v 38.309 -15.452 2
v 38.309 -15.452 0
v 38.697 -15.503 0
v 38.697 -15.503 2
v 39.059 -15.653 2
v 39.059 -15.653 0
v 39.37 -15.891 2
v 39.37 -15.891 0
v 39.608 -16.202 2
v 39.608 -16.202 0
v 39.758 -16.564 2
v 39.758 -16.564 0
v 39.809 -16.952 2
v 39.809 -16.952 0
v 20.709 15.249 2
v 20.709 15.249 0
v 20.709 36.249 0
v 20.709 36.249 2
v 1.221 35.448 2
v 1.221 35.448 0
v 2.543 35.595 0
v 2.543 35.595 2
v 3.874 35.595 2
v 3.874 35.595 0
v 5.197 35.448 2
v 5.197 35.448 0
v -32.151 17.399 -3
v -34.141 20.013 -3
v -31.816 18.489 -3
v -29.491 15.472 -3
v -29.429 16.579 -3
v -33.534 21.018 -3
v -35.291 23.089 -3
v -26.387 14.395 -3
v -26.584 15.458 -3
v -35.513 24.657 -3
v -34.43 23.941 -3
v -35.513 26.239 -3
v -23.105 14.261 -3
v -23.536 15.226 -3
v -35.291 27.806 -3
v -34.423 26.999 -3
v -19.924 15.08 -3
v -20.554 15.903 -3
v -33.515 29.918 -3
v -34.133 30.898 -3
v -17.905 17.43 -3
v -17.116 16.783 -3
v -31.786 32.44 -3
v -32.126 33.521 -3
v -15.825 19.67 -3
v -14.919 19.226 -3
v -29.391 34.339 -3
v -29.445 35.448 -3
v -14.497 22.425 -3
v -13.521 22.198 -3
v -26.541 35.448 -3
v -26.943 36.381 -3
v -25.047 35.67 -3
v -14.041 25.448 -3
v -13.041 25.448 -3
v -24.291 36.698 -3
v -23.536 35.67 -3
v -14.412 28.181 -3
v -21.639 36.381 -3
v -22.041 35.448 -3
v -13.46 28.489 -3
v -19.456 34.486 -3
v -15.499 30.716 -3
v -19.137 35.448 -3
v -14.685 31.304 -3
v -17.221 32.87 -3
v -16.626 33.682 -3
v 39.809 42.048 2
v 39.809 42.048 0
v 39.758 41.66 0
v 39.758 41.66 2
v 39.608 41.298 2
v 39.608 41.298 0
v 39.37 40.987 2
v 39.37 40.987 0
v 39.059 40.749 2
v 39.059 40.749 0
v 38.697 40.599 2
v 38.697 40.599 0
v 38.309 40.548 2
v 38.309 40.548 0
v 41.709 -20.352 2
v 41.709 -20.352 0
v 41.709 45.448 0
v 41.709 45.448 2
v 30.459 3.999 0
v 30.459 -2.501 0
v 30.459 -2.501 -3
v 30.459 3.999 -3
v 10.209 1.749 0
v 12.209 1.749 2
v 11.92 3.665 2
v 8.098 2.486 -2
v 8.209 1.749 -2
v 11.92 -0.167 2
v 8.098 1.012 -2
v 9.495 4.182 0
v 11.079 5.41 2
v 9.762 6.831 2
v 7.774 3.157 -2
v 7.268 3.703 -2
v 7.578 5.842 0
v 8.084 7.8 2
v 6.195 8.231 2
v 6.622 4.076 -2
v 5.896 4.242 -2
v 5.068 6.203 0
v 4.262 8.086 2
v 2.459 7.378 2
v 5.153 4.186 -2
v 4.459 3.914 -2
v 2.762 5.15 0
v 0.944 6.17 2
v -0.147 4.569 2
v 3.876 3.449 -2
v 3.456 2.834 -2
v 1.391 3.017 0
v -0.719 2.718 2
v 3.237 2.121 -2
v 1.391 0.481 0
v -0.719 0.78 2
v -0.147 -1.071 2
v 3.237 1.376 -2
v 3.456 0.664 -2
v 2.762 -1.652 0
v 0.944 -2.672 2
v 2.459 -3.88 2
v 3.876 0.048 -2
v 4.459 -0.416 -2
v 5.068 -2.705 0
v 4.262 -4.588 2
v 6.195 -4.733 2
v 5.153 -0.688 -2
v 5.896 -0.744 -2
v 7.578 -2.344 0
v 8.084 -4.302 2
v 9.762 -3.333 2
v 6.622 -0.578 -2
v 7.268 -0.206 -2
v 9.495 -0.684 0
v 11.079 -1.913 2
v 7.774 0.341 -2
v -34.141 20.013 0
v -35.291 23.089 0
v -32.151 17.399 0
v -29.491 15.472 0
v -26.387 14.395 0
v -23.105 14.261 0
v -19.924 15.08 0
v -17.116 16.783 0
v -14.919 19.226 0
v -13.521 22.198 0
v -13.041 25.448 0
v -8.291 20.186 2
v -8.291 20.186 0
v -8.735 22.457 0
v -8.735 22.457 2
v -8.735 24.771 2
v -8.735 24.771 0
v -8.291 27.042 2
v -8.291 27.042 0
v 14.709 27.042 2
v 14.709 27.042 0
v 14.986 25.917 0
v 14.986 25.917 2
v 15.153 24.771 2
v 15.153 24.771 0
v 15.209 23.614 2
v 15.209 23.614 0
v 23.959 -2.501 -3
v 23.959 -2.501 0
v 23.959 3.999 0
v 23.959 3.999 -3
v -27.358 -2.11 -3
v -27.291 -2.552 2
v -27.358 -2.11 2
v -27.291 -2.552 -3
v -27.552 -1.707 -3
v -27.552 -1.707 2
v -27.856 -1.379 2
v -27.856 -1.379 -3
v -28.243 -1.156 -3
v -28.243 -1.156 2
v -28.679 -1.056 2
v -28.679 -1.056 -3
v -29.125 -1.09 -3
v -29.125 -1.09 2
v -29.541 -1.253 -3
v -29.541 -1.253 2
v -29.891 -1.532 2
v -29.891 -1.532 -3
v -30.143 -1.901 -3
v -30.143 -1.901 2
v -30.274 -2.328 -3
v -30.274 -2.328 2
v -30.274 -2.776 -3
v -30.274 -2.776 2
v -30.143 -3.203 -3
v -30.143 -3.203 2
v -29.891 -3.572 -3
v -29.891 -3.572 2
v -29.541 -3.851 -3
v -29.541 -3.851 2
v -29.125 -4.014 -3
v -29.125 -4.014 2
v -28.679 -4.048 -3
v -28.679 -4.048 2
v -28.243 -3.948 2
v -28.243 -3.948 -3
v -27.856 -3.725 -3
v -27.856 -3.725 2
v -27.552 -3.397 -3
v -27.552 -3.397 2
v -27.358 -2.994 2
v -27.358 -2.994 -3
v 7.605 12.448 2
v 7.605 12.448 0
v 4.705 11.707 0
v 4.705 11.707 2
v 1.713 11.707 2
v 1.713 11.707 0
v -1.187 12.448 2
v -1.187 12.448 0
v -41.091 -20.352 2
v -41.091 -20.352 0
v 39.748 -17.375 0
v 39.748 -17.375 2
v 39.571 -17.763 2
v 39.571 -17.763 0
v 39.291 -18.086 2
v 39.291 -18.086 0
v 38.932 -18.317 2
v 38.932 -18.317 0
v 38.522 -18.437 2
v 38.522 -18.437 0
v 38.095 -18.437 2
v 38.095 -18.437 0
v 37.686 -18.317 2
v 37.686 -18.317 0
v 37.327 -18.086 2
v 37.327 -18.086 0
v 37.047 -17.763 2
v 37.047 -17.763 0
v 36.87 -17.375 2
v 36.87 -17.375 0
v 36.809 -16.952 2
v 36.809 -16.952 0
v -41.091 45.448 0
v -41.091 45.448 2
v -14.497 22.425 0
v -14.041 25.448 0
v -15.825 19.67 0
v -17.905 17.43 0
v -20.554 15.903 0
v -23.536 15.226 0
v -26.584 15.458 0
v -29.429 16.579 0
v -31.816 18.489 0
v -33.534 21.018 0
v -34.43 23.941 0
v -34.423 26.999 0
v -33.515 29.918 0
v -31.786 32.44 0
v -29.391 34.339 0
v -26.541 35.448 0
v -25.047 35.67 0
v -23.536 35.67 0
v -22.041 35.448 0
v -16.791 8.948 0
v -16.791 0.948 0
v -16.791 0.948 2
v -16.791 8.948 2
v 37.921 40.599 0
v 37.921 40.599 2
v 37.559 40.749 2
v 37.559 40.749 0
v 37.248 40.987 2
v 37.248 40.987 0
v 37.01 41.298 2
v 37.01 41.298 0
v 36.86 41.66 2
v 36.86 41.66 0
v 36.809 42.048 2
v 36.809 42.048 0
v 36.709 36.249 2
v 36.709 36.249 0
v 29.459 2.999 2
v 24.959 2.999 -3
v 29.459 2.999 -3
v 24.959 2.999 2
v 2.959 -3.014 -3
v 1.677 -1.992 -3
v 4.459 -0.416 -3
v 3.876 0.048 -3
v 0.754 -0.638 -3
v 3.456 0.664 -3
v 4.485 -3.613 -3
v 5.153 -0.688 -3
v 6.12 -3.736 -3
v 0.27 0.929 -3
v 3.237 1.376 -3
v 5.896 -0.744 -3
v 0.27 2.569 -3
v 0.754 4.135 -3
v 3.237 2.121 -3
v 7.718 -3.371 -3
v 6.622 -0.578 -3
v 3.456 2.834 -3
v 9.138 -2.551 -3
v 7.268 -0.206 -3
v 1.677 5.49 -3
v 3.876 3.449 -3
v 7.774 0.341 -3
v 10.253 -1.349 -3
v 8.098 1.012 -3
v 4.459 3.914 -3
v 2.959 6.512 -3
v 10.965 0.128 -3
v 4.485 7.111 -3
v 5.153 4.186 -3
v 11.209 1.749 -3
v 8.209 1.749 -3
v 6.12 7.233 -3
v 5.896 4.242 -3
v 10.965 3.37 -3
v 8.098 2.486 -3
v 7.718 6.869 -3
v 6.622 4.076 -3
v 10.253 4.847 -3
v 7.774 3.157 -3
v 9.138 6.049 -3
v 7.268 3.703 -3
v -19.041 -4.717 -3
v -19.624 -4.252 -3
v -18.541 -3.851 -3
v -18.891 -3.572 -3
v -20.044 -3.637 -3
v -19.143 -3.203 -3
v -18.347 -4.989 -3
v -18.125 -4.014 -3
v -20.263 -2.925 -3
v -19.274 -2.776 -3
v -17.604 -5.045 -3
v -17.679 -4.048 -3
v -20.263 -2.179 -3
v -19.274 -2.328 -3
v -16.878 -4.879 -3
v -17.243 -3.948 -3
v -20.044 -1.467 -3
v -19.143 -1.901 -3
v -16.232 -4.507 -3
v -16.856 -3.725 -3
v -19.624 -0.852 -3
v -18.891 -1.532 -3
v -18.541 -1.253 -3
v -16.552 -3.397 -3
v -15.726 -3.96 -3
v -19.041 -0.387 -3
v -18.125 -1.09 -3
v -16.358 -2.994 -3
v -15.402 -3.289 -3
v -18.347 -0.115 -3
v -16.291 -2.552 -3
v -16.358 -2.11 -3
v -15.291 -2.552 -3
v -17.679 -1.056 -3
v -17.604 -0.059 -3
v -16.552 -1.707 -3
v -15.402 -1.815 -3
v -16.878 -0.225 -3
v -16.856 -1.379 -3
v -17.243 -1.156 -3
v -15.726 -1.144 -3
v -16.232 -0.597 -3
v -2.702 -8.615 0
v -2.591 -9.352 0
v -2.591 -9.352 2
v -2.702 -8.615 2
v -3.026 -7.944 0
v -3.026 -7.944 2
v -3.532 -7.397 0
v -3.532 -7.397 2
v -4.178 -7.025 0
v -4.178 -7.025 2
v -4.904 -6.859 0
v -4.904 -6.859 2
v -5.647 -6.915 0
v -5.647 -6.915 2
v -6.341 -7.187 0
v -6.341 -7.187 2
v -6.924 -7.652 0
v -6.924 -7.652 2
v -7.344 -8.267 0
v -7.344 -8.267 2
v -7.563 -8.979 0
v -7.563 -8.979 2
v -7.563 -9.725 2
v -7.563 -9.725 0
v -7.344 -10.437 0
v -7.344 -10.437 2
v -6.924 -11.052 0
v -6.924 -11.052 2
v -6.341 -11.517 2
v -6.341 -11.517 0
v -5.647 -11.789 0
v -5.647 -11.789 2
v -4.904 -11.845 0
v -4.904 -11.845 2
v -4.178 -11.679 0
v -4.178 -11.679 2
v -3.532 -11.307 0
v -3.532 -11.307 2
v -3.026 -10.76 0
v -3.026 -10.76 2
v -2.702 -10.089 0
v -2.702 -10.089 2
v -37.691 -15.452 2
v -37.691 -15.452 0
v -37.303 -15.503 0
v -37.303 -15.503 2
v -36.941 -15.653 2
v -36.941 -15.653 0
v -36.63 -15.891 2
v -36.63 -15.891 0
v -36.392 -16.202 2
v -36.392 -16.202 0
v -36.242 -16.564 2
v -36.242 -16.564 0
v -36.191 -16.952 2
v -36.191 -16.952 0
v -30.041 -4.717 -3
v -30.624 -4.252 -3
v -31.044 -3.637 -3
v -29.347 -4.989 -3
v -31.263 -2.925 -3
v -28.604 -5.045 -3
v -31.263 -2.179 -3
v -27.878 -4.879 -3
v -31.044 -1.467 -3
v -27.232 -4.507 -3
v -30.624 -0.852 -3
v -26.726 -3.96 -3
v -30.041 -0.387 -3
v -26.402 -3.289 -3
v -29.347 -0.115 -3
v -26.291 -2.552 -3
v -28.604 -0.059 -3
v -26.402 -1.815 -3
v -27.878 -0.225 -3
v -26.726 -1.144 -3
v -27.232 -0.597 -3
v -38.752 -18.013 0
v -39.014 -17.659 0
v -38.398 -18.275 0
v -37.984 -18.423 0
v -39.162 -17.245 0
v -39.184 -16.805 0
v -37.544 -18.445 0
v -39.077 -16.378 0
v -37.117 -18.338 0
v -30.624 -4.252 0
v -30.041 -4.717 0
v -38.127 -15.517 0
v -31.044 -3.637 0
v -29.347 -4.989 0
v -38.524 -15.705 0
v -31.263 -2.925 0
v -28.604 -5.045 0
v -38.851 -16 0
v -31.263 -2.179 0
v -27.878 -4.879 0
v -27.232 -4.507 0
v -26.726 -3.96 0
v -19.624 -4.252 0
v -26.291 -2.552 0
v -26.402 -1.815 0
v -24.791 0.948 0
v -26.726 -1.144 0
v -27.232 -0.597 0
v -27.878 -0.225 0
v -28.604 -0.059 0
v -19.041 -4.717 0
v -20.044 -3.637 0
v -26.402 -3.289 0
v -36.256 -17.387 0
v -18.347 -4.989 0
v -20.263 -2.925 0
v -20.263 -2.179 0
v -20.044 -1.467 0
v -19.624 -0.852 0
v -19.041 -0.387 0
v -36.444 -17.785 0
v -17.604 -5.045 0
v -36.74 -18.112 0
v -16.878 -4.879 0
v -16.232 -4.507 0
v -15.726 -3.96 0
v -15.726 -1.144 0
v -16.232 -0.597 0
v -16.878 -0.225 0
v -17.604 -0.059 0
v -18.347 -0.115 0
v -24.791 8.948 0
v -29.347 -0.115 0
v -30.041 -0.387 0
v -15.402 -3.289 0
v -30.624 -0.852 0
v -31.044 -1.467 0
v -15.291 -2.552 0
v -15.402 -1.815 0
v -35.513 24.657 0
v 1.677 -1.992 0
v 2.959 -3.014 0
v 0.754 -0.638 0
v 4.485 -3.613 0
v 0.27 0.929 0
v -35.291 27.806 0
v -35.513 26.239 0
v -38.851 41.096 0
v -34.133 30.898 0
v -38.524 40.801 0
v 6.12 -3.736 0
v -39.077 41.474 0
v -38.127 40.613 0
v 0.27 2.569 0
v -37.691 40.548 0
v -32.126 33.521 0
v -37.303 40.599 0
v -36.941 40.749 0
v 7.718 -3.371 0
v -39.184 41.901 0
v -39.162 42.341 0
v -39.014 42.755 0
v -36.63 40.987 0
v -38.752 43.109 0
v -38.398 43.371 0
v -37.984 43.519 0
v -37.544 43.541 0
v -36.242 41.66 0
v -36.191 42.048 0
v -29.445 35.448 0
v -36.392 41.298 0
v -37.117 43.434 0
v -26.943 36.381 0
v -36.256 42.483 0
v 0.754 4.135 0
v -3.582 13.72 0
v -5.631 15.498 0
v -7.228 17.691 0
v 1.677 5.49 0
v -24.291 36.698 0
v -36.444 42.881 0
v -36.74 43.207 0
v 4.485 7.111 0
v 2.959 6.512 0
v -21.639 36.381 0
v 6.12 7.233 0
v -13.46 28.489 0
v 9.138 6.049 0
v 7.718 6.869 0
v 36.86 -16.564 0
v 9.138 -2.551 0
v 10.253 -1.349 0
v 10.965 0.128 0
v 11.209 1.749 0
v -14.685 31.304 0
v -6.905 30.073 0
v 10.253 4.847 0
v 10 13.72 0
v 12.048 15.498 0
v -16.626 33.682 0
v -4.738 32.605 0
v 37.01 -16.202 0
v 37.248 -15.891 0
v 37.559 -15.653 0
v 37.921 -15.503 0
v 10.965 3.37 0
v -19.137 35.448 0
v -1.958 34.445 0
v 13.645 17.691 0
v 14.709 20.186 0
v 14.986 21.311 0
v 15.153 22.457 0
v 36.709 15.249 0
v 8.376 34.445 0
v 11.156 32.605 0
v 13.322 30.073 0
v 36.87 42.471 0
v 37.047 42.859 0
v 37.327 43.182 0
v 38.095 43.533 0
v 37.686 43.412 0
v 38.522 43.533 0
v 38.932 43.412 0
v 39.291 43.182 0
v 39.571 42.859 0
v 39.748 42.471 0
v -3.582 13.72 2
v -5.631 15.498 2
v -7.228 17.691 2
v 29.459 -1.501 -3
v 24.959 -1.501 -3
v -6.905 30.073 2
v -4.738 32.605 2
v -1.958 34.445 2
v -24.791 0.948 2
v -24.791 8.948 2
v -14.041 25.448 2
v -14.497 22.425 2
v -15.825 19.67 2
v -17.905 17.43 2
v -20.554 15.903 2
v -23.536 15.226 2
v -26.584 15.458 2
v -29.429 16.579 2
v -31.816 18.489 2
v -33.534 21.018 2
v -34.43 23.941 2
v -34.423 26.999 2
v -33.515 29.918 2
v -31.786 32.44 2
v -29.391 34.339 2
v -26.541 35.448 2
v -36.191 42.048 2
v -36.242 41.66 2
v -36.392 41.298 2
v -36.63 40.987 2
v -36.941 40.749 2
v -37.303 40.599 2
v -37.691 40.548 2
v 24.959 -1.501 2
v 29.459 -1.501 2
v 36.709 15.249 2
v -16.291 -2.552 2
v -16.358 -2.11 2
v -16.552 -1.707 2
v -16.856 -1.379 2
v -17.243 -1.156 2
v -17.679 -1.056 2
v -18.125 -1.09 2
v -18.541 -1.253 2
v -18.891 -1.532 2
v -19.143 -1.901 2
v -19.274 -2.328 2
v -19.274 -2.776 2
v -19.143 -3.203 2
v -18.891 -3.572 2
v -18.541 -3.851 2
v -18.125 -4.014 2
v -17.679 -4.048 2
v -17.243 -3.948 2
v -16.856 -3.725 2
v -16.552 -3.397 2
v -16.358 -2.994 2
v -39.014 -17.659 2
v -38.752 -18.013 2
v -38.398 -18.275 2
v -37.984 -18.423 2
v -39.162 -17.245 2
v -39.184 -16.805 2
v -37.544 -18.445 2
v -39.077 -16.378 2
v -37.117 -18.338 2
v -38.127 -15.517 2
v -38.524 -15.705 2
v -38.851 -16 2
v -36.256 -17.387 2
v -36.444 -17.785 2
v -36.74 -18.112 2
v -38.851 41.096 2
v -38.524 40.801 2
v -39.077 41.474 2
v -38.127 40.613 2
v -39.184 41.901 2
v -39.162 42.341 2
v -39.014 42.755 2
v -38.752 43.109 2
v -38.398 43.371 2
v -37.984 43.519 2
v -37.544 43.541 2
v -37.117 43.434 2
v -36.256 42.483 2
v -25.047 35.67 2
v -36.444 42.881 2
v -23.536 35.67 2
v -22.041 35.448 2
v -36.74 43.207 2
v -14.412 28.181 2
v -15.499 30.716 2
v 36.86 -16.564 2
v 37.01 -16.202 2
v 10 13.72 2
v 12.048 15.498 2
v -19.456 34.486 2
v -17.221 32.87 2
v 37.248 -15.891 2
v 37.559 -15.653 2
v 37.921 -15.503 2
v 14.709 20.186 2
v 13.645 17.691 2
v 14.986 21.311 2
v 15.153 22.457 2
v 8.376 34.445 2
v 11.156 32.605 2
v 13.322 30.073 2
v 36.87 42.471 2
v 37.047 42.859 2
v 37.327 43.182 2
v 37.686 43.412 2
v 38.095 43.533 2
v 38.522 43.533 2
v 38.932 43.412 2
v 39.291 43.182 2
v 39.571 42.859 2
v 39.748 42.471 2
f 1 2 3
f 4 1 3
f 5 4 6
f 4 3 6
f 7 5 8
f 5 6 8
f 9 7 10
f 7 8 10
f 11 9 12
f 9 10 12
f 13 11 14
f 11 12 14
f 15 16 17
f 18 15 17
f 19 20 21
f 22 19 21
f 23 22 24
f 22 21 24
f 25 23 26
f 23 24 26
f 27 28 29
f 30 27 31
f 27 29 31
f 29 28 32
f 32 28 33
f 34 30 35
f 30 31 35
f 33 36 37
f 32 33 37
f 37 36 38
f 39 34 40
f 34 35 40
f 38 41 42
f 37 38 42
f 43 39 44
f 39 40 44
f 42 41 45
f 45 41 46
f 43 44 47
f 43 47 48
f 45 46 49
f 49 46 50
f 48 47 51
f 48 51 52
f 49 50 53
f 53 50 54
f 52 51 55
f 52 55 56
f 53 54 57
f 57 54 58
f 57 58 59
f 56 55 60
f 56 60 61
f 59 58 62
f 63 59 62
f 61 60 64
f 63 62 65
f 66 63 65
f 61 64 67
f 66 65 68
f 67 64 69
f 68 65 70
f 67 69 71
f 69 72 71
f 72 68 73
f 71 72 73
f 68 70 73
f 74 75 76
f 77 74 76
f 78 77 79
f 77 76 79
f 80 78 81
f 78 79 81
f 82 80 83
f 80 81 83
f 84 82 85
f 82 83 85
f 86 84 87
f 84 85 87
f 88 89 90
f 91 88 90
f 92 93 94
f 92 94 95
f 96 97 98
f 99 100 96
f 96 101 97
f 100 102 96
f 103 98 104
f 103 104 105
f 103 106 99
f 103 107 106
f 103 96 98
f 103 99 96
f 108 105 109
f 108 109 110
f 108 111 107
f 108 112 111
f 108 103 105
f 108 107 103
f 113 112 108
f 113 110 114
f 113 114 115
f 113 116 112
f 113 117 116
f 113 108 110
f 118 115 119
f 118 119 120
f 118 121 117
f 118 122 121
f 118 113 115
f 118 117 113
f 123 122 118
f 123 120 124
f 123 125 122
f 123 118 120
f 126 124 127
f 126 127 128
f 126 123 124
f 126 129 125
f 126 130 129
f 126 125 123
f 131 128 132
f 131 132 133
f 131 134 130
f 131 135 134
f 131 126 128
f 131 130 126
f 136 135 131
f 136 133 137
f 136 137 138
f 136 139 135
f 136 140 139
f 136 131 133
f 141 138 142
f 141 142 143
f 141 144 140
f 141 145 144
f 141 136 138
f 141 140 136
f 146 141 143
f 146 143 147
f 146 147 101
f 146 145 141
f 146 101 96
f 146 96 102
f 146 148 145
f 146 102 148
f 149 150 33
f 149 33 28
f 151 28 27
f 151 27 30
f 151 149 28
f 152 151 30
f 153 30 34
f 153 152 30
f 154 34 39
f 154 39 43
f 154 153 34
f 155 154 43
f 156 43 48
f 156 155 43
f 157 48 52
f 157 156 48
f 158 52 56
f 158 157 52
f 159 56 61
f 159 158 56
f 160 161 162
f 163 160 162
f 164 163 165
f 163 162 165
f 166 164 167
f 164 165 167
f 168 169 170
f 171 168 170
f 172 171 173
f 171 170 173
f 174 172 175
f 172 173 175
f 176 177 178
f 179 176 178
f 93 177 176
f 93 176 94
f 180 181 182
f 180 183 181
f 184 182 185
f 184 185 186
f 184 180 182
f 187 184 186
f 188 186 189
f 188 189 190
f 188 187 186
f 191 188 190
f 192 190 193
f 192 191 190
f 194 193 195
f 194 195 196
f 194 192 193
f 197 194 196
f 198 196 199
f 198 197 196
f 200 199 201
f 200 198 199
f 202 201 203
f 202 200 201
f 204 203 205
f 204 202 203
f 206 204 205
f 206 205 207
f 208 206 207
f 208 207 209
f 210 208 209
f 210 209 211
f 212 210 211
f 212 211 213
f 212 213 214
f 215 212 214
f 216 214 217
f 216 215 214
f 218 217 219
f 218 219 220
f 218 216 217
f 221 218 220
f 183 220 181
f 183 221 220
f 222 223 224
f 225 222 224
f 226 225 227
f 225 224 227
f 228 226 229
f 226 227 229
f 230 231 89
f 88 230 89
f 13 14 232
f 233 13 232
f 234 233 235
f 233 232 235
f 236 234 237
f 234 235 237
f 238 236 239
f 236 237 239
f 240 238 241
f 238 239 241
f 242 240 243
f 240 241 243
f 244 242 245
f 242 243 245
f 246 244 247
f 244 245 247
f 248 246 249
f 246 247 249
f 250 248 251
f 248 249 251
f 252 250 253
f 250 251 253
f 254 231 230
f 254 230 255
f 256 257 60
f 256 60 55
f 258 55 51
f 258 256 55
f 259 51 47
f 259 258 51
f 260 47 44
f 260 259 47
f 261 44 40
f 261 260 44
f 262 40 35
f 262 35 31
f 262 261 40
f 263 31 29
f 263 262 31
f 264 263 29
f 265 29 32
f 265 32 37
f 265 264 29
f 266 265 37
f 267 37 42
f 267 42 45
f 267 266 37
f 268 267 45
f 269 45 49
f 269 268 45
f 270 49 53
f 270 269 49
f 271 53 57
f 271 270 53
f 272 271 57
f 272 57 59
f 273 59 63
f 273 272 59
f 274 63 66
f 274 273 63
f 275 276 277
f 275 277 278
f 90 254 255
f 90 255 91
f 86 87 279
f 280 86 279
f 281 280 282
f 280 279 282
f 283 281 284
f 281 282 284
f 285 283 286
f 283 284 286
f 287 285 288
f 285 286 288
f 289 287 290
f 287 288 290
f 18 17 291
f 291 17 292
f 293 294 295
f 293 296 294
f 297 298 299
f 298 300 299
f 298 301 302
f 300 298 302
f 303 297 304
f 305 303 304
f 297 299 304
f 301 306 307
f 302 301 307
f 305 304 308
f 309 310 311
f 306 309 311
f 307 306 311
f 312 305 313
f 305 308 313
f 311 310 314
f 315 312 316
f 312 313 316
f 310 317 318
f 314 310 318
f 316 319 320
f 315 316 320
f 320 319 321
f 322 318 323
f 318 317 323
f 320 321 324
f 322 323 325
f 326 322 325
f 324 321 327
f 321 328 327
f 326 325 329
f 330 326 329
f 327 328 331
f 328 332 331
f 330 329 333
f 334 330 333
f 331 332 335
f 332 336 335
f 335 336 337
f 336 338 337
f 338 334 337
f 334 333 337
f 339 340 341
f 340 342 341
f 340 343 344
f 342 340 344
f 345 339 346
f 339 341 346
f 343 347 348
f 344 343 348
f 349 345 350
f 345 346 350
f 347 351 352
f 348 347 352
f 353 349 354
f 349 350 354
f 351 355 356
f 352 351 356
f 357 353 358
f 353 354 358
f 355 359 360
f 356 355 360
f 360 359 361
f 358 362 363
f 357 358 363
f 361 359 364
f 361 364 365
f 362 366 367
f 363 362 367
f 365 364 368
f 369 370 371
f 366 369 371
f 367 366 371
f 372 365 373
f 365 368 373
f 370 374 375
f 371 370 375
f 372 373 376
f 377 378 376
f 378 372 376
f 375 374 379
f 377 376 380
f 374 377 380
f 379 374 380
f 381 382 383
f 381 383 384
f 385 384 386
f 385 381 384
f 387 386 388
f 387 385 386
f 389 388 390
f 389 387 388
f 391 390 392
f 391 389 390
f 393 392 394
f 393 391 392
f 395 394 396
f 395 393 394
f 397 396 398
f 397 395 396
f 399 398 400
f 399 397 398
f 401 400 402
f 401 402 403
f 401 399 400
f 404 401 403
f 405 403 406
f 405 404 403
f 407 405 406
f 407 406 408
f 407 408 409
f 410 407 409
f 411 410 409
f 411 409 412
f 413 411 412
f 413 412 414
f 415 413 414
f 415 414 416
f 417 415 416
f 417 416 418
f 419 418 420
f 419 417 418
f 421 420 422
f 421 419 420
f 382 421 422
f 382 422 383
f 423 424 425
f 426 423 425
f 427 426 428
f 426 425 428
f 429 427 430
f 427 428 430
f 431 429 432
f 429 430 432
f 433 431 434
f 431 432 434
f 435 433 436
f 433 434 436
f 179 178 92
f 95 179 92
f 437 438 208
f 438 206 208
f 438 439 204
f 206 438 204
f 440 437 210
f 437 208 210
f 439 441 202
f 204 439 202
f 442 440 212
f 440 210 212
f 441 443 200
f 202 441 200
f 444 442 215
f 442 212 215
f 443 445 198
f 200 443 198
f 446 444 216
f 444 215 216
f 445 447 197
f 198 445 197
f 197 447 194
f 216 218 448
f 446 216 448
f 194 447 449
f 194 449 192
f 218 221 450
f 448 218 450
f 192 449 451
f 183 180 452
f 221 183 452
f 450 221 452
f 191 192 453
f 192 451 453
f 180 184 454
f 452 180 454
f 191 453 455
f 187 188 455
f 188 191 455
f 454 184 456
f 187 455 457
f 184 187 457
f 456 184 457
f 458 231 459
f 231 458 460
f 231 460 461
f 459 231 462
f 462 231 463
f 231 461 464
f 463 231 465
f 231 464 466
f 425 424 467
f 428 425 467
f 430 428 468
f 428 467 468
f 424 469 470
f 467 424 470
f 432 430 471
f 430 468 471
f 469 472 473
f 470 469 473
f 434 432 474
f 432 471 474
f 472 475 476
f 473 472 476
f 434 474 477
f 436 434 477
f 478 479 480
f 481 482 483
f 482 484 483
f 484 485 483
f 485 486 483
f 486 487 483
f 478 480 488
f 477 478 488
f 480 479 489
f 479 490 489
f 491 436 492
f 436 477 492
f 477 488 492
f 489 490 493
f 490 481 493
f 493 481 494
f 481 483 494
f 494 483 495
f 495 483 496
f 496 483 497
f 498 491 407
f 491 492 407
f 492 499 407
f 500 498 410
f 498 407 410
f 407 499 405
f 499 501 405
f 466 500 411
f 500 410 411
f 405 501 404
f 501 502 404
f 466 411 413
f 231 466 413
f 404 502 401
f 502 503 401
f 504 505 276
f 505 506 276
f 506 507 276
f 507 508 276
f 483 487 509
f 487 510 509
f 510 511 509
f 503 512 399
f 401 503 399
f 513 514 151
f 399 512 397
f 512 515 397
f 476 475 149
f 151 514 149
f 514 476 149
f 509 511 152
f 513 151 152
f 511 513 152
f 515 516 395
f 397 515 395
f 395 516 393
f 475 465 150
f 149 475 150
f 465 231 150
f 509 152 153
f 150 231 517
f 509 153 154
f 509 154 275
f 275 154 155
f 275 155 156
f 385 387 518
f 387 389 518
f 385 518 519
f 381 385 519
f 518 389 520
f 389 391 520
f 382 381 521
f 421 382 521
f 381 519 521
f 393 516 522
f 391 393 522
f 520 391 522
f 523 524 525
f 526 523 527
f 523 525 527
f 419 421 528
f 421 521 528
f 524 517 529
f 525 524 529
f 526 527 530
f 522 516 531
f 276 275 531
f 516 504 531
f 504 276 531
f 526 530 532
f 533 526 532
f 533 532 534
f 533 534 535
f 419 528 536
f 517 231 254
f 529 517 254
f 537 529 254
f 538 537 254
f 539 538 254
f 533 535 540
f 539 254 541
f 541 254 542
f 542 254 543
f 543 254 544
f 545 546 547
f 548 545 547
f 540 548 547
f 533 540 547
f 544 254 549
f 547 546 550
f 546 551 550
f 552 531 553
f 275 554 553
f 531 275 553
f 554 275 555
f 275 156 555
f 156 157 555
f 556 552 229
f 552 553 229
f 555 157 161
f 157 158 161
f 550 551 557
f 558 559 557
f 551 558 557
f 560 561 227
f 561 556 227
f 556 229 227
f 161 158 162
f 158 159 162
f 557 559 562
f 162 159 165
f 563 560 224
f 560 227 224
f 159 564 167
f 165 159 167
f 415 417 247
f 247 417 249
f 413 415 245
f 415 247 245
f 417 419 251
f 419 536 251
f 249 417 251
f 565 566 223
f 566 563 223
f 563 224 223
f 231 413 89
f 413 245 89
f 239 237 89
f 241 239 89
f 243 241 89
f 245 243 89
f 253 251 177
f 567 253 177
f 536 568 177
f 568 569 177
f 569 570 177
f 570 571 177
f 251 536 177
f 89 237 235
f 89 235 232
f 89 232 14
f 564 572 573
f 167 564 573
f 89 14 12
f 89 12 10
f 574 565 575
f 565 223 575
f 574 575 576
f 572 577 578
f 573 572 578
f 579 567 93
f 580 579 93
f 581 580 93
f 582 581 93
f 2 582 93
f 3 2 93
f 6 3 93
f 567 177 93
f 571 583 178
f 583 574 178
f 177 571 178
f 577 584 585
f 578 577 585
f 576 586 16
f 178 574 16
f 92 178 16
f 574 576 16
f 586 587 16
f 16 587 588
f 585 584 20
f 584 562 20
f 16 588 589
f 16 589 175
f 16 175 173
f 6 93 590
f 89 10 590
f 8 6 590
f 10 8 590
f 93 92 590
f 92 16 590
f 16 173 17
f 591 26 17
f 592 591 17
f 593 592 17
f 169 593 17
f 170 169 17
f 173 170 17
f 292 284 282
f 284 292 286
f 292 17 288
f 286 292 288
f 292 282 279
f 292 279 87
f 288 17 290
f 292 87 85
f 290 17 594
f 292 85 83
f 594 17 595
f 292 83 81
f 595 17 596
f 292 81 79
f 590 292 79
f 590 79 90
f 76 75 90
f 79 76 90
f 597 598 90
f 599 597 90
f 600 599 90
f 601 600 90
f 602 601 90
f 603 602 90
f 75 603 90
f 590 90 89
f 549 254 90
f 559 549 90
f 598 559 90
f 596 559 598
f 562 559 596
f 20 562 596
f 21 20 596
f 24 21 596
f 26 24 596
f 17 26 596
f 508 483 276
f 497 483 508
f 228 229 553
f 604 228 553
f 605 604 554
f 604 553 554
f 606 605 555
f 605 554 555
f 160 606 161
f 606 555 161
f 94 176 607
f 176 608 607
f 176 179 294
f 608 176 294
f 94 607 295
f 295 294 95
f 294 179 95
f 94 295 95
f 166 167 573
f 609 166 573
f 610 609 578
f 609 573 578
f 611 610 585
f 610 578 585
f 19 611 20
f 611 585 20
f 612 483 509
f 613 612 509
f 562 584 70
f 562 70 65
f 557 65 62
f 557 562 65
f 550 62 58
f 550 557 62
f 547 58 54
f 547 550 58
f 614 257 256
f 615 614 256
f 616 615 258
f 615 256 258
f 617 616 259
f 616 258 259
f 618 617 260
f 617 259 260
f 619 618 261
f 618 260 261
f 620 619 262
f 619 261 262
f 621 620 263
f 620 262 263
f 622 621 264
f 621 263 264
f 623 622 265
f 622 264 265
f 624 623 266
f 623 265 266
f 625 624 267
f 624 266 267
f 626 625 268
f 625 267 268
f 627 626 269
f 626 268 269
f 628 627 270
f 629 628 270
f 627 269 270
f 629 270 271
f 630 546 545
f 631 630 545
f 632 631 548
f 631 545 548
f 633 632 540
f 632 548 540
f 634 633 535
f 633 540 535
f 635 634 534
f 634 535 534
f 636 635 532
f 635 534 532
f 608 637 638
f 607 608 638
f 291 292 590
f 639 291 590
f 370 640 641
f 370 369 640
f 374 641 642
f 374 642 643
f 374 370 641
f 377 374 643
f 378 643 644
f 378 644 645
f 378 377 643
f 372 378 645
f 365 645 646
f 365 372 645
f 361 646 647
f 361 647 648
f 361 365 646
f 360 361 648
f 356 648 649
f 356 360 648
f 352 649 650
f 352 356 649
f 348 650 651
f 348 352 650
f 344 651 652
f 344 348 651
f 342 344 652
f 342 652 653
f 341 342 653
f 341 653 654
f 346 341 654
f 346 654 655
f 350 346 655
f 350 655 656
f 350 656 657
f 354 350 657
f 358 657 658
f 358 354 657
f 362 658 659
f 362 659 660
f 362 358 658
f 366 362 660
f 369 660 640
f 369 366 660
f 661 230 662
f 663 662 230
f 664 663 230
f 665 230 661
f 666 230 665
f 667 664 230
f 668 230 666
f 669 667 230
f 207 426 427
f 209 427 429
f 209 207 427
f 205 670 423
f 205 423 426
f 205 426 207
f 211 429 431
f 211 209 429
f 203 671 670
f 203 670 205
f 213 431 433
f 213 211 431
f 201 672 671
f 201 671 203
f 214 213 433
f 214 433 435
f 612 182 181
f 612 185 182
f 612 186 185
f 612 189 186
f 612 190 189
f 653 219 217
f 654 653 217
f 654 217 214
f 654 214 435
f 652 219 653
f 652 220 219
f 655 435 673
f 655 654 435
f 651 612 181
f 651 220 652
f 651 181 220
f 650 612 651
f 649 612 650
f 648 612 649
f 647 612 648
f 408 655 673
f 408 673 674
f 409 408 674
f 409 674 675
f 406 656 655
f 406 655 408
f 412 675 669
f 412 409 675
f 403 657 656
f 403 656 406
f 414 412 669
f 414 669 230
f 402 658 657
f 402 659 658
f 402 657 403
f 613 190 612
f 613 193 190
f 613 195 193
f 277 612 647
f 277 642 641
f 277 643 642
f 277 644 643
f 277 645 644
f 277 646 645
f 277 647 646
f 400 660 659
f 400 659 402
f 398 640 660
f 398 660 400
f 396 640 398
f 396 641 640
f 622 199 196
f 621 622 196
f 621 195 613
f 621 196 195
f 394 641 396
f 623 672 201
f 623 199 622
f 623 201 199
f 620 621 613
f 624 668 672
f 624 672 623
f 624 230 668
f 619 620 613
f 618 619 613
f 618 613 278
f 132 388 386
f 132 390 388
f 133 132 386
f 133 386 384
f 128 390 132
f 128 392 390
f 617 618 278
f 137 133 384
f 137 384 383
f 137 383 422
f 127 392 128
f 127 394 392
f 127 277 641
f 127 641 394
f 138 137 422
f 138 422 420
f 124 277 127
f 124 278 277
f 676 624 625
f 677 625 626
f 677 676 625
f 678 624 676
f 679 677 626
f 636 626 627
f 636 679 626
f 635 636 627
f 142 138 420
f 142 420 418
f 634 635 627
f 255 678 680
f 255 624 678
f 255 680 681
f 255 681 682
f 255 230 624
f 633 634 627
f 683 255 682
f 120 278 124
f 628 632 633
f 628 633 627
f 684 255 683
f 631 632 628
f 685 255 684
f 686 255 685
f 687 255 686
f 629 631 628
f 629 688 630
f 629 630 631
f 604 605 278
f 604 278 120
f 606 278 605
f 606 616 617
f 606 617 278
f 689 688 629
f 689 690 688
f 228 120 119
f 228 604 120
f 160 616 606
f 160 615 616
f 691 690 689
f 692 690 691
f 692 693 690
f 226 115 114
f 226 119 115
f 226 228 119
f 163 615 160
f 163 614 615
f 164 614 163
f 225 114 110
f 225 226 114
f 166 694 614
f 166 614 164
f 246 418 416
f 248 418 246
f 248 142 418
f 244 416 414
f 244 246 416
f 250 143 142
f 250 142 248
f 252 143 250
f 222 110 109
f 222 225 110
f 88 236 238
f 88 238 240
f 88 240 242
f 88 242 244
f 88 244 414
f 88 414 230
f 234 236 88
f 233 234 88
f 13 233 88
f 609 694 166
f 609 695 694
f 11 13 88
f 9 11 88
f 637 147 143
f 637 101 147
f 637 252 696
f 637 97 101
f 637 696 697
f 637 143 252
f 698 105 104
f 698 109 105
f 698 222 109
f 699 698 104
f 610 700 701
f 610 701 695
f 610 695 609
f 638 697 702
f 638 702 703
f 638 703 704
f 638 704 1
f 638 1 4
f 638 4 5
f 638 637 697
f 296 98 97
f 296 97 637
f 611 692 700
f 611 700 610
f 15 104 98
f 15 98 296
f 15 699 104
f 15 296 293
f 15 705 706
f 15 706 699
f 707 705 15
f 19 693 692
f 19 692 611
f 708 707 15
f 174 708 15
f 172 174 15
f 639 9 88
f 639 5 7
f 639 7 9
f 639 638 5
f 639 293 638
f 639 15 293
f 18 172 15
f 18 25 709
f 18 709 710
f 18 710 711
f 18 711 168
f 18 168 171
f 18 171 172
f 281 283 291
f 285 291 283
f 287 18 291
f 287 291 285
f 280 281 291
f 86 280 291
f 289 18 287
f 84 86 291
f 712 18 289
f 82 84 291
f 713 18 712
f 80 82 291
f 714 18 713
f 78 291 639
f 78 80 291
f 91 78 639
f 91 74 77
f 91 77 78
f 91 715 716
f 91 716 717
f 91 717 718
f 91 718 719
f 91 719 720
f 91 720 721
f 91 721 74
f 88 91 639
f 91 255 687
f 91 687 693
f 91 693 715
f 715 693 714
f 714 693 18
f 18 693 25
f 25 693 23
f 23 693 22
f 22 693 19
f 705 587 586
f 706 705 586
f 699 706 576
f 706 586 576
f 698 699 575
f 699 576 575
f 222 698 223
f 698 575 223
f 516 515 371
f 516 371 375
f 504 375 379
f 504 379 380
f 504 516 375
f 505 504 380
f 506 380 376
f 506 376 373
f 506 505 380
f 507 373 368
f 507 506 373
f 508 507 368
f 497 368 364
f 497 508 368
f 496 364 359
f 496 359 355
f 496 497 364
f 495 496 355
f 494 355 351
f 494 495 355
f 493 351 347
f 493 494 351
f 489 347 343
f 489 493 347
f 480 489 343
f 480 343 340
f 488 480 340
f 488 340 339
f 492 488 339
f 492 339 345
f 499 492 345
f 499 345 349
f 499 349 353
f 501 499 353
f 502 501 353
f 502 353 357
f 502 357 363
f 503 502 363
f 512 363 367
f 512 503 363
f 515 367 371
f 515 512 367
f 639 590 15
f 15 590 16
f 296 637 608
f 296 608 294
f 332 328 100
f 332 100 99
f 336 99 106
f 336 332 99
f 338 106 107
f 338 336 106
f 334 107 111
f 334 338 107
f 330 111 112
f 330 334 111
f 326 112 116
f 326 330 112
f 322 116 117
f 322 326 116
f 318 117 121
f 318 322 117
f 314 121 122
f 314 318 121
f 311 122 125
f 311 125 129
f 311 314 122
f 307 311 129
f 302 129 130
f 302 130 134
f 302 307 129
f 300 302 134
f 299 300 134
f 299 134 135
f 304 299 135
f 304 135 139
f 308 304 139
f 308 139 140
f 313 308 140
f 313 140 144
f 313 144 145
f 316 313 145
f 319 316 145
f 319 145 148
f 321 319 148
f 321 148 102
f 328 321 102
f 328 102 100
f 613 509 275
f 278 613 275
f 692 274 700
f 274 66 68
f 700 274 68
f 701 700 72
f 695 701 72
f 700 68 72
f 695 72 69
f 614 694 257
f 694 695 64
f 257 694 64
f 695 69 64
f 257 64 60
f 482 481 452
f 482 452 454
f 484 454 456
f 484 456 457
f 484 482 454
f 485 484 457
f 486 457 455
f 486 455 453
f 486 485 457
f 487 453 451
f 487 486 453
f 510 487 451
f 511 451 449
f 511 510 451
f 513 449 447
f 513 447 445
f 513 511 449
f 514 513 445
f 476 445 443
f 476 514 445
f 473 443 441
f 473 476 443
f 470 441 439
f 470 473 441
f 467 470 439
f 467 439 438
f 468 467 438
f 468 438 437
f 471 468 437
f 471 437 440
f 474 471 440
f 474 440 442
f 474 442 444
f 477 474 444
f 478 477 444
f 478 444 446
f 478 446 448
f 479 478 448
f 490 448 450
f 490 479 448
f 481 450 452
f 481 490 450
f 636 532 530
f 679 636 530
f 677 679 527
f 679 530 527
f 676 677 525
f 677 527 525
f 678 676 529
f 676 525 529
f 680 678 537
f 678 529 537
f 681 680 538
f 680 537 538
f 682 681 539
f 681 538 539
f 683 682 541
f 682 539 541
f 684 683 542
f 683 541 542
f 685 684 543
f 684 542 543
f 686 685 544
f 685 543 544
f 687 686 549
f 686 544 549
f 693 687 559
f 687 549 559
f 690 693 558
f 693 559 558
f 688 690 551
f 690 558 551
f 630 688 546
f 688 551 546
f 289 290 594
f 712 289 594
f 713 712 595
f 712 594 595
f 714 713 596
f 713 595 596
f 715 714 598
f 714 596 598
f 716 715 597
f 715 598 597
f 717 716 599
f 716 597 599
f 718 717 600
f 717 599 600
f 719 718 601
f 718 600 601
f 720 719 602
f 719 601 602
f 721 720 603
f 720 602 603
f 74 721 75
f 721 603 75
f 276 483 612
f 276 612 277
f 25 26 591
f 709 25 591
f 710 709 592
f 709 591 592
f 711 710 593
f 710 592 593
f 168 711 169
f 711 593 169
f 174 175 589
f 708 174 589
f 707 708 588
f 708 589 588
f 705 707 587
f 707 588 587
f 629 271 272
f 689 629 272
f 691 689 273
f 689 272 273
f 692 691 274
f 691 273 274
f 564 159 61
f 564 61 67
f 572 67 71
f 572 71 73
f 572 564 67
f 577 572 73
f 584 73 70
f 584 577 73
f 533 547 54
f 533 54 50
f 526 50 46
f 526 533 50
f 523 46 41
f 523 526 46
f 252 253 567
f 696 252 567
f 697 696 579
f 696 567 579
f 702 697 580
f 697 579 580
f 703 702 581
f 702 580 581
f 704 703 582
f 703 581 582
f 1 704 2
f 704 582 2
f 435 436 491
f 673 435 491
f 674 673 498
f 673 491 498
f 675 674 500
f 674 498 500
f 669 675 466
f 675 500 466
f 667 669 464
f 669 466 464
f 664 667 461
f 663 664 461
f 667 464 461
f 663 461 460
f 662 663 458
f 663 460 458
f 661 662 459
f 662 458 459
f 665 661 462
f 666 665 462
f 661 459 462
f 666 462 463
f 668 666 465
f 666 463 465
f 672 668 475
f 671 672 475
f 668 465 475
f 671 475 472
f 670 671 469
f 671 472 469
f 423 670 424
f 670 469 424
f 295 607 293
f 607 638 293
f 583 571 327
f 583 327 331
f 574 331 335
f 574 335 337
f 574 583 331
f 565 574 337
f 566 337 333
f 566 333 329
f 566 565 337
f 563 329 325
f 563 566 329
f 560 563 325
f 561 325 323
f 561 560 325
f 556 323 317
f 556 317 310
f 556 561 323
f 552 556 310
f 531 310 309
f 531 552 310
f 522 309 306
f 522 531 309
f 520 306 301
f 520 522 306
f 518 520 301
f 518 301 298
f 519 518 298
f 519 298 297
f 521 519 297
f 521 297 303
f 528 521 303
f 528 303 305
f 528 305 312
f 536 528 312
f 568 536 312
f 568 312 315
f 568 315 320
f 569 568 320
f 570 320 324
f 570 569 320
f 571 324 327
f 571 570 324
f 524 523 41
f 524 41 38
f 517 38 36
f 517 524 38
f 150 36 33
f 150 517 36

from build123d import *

# Parameters (mm, degrees)
F0_W     = 82.8
F0_H     = 65.8
F0_R     = 2.5
F0_W_2   = 8
F0_H_2   = 8
F0_R_2   = 5.5
F0_W_3   = 6.5
F0_H_3   = 6.5
F0_W_4   = 4.5
F0_H_4   = 4.5
F0_R_3   = 1.5
F1_DEPTH = 2
F2_DEPTH = 3
F3_SIZE  = 4


# Not quite as in the source:
# - a feature names something its author has since deleted; it is built from what else it names


with BuildPart() as f1:
    # F0 (on Top) → F1 (new body)
    with BuildSketch(Plane.XY):
        with Locations((0.3088639305, 12.5479439557)):
            Rectangle(F0_W, F0_H)
        with BuildLine():
            ThreePointArc((-37.6911360695, 40.5479439557), (-38.7517962413, 43.1086041274), (-36.1911360695, 42.0479439557))
            Line((-36.1911360695, 42.0479439557), (36.8088639305, 42.0479439557))
            ThreePointArc((36.8088639305, 42.0479439557), (38.3088639305, 43.5479439557), (39.8088639305, 42.0479439557))
            ThreePointArc((39.8088639305, 42.0479439557), (39.3695241023, 40.9872837839), (38.3088639305, 40.5479439557))
            Line((38.3088639305, 40.5479439557), (38.3088639305, -15.4520560443))
            ThreePointArc((38.3088639305, -15.4520560443), (39.3695241023, -15.8913958726), (39.8088639305, -16.9520560443))
            ThreePointArc((39.8088639305, -16.9520560443), (38.3088639305, -18.4520560443), (36.8088639305, -16.9520560443))
            Line((36.8088639305, -16.9520560443), (-36.1911360695, -16.9520560443))
            ThreePointArc((-36.1911360695, -16.9520560443), (-38.7517962413, -18.0127162161), (-37.6911360695, -15.4520560443))
            Line((-37.6911360695, -15.4520560443), (-37.6911360695, 40.5479439557))
        make_face(mode=Mode.SUBTRACT)
        with BuildLine():
            Line((36.8088639305, 42.0479439557), (-36.1911360695, 42.0479439557))
            ThreePointArc((-36.1911360695, 42.0479439557), (-36.6304758977, 40.9872837839), (-37.6911360695, 40.5479439557))
            Line((-37.6911360695, 40.5479439557), (-37.6911360695, -15.4520560443))
            ThreePointArc((-37.6911360695, -15.4520560443), (-36.6304758977, -15.8913958726), (-36.1911360695, -16.9520560443))
            Line((-36.1911360695, -16.9520560443), (36.8088639305, -16.9520560443))
            ThreePointArc((36.8088639305, -16.9520560443), (37.2482037587, -15.8913958726), (38.3088639305, -15.4520560443))
            Line((38.3088639305, -15.4520560443), (38.3088639305, 40.5479439557))
            ThreePointArc((38.3088639305, 40.5479439557), (37.2482037587, 40.9872837839), (36.8088639305, 42.0479439557))
        make_face()
        with BuildLine():
            Line((-35.2911360695, 27.8064392387), (-35.2911360695, 35.4479439557))
            Line((-35.2911360695, 35.4479439557), (-29.4450181015, 35.4479439557))
            ThreePointArc((-29.4450181015, 35.4479439557), (-24.2911360695, 36.6979439557), (-19.1372540375, 35.4479439557))
            Line((-19.1372540375, 35.4479439557), (-8.2911360695, 35.4479439557))
            Line((-8.2911360695, 35.4479439557), (1.2206639384, 35.4479439557))
            ThreePointArc((1.2206639384, 35.4479439557), (3.2088639305, 35.6137958751), (5.1970639225, 35.4479439557))
            Line((5.1970639225, 35.4479439557), (14.7088639305, 35.4479439557))
            Line((14.7088639305, 35.4479439557), (20.7088639305, 35.4479439557))
            Line((20.7088639305, 35.4479439557), (20.7088639305, 36.2488545371))
            Line((20.7088639305, 36.2488545371), (36.7088639305, 36.2488545371))
            Line((36.7088639305, 36.2488545371), (36.7088639305, 15.2488545371))
            Line((36.7088639305, 15.2488545371), (34.7088639305, 15.2488545371))
            Line((34.7088639305, 15.2488545371), (34.7088639305, -14.2511454629))
            Line((34.7088639305, -14.2511454629), (-35.2911360695, -14.5520560443))
            Line((-35.2911360695, -14.5520560443), (-35.2911360695, 23.0894486726))
            ThreePointArc((-35.2911360695, 23.0894486726), (-35.5411360695, 25.4479439557), (-35.2911360695, 27.8064392387))
        make_face(mode=Mode.SUBTRACT)
        with BuildLine():
            Line((-8.2911360695, 35.4479439557), (-19.1372540375, 35.4479439557))
            ThreePointArc((-19.1372540375, 35.4479439557), (-14.6853130215, 31.3037670037), (-13.0411360695, 25.4479439557))
            ThreePointArc((-13.0411360695, 25.4479439557), (-23.105281947, 14.260618538), (-35.2911360695, 23.0894486726))
            Line((-35.2911360695, 23.0894486726), (-35.2911360695, -14.5520560443))
            Line((-35.2911360695, -14.5520560443), (34.7088639305, -14.2511454629))
            Line((34.7088639305, -14.2511454629), (34.7088639305, 15.2488545371))
            Line((34.7088639305, 15.2488545371), (20.7088639305, 15.2488545371))
            Line((20.7088639305, 15.2488545371), (20.7088639305, 35.4479439557))
            Line((20.7088639305, 35.4479439557), (14.7088639305, 35.4479439557))
            Line((14.7088639305, 35.4479439557), (14.7088639305, 27.0416231753))
            ThreePointArc((14.7088639305, 27.0416231753), (15.0832060175, 25.3458466827), (15.2088639305, 23.6137958751))
            ThreePointArc((15.2088639305, 23.6137958751), (15.0832060175, 21.8817450676), (14.7088639305, 20.1859685749))
            Line((14.7088639305, 20.1859685749), (14.7088639305, 12.4479439557))
            Line((14.7088639305, 12.4479439557), (7.604742786, 12.4479439557))
            ThreePointArc((7.604742786, 12.4479439557), (3.2088639305, 11.6137958751), (-1.187014925, 12.4479439557))
            Line((-1.187014925, 12.4479439557), (-8.2911360695, 12.4479439557))
            Line((-8.2911360695, 12.4479439557), (-8.2911360695, 20.1859685749))
            ThreePointArc((-8.2911360695, 20.1859685749), (-8.7911360695, 23.6137958751), (-8.2911360695, 27.0416231753))
            Line((-8.2911360695, 27.0416231753), (-8.2911360695, 35.4479439557))
        make_face()
        with Locations((-5.0911360695, -9.3520560443)):
            Circle(F0_R, mode=Mode.SUBTRACT)
        with Locations((-28.7911360695, -2.5520560443)):
            Circle(F0_R, mode=Mode.SUBTRACT)
        with Locations((-20.7911360695, 4.9479439557)):
            Rectangle(F0_W_2, F0_H_2, mode=Mode.SUBTRACT)
        with Locations((-17.7911360695, -2.5520560443)):
            Circle(F0_R, mode=Mode.SUBTRACT)
        with Locations((5.7088639305, 1.7488545371)):
            Circle(F0_R_2, mode=Mode.SUBTRACT)
        with Locations((27.2088639305, 0.7488545371)):
            Rectangle(F0_W_3, F0_H_3, mode=Mode.SUBTRACT)
        with Locations((5.7088639305, 1.7488545371)):
            Circle(F0_R_2)
        with Locations((5.7088639305, 1.7488545371)):
            Circle(F0_R, mode=Mode.SUBTRACT)
        with BuildLine():
            Line((-26.5411360695, 35.4479439557), (-29.4450181015, 35.4479439557))
            ThreePointArc((-29.4450181015, 35.4479439557), (-33.2261864197, 32.2836864346), (-35.2911360695, 27.8064392387))
            Line((-35.2911360695, 27.8064392387), (-35.2911360695, 23.0894486726))
            ThreePointArc((-35.2911360695, 23.0894486726), (-23.105281947, 14.260618538), (-13.0411360695, 25.4479439557))
            ThreePointArc((-13.0411360695, 25.4479439557), (-14.6853130215, 31.3037670037), (-19.1372540375, 35.4479439557))
            Line((-19.1372540375, 35.4479439557), (-22.0411360695, 35.4479439557))
            ThreePointArc((-22.0411360695, 35.4479439557), (-16.2872307727, 31.8510681931), (-14.0411360695, 25.4479439557))
            ThreePointArc((-14.0411360695, 25.4479439557), (-30.694260307, 17.4440386589), (-26.5411360695, 35.4479439557))
        make_face()
        with Locations((27.2088639305, 0.7488545371)):
            Rectangle(F0_W_3, F0_H_3)
        with Locations((27.2088639305, 0.7488545371)):
            Rectangle(F0_W_4, F0_H_4, mode=Mode.SUBTRACT)
        with BuildLine():
            Line((1.2206639384, 35.4479439557), (-8.2911360695, 35.4479439557))
            Line((-8.2911360695, 35.4479439557), (-8.2911360695, 27.0416231753))
            ThreePointArc((-8.2911360695, 27.0416231753), (-4.7377983891, 32.6054897077), (1.2206639384, 35.4479439557))
        make_face()
        with BuildLine():
            Line((14.7088639305, 35.4479439557), (5.1970639225, 35.4479439557))
            ThreePointArc((5.1970639225, 35.4479439557), (11.1555262501, 32.6054897077), (14.7088639305, 27.0416231753))
            Line((14.7088639305, 27.0416231753), (14.7088639305, 35.4479439557))
        make_face()
        with Locations((-17.7911360695, -2.5520560443)):
            Circle(F0_R)
        with Locations((-17.7911360695, -2.5520560443)):
            Circle(F0_R_3, mode=Mode.SUBTRACT)
        with Locations((-28.7911360695, -2.5520560443)):
            Circle(F0_R)
        with Locations((-28.7911360695, -2.5520560443)):
            Circle(F0_R_3, mode=Mode.SUBTRACT)
        with BuildLine():
            ThreePointArc((-1.187014925, 12.4479439557), (-5.6307626114, 15.4983166779), (-8.2911360695, 20.1859685749))
            Line((-8.2911360695, 20.1859685749), (-8.2911360695, 12.4479439557))
            Line((-8.2911360695, 12.4479439557), (-1.187014925, 12.4479439557))
        make_face()
        with BuildLine():
            Line((14.7088639305, 12.4479439557), (14.7088639305, 20.1859685749))
            ThreePointArc((14.7088639305, 20.1859685749), (12.0484904723, 15.4983166779), (7.604742786, 12.4479439557))
            Line((7.604742786, 12.4479439557), (14.7088639305, 12.4479439557))
        make_face()
        with BuildLine():
            Line((-29.4450181015, 35.4479439557), (-35.2911360695, 35.4479439557))
            Line((-35.2911360695, 35.4479439557), (-35.2911360695, 27.8064392387))
            ThreePointArc((-35.2911360695, 27.8064392387), (-33.2261864197, 32.2836864346), (-29.4450181015, 35.4479439557))
        make_face()
        with BuildLine():
            ThreePointArc((-19.1372540375, 35.4479439557), (-24.2911360695, 36.6979439557), (-29.4450181015, 35.4479439557))
            Line((-29.4450181015, 35.4479439557), (-26.5411360695, 35.4479439557))
            ThreePointArc((-26.5411360695, 35.4479439557), (-24.2911360695, 35.6979439557), (-22.0411360695, 35.4479439557))
            Line((-22.0411360695, 35.4479439557), (-19.1372540375, 35.4479439557))
        make_face()
        with BuildLine():
            Line((-35.2911360695, 23.0894486726), (-35.2911360695, 27.8064392387))
            ThreePointArc((-35.2911360695, 27.8064392387), (-35.5411360695, 25.4479439557), (-35.2911360695, 23.0894486726))
        make_face()
    extrude(amount=F1_DEPTH)

    # F0 (on Top) → F2 (join)
    with BuildSketch(Plane.XY):
        with Locations((27.2088639305, 0.7488545371)):
            Rectangle(F0_W_3, F0_H_3)
        with Locations((27.2088639305, 0.7488545371)):
            Rectangle(F0_W_4, F0_H_4, mode=Mode.SUBTRACT)
        with BuildLine():
            Line((-26.5411360695, 35.4479439557), (-29.4450181015, 35.4479439557))
            ThreePointArc((-29.4450181015, 35.4479439557), (-33.2261864197, 32.2836864346), (-35.2911360695, 27.8064392387))
            Line((-35.2911360695, 27.8064392387), (-35.2911360695, 23.0894486726))
            ThreePointArc((-35.2911360695, 23.0894486726), (-23.105281947, 14.260618538), (-13.0411360695, 25.4479439557))
            ThreePointArc((-13.0411360695, 25.4479439557), (-14.6853130215, 31.3037670037), (-19.1372540375, 35.4479439557))
            Line((-19.1372540375, 35.4479439557), (-22.0411360695, 35.4479439557))
            ThreePointArc((-22.0411360695, 35.4479439557), (-16.2872307727, 31.8510681931), (-14.0411360695, 25.4479439557))
            ThreePointArc((-14.0411360695, 25.4479439557), (-30.694260307, 17.4440386589), (-26.5411360695, 35.4479439557))
        make_face()
        with Locations((-17.7911360695, -2.5520560443)):
            Circle(F0_R)
        with Locations((-17.7911360695, -2.5520560443)):
            Circle(F0_R_3, mode=Mode.SUBTRACT)
        with Locations((5.7088639305, 1.7488545371)):
            Circle(F0_R_2)
        with Locations((5.7088639305, 1.7488545371)):
            Circle(F0_R, mode=Mode.SUBTRACT)
        with BuildLine():
            ThreePointArc((-19.1372540375, 35.4479439557), (-24.2911360695, 36.6979439557), (-29.4450181015, 35.4479439557))
            Line((-29.4450181015, 35.4479439557), (-26.5411360695, 35.4479439557))
            ThreePointArc((-26.5411360695, 35.4479439557), (-24.2911360695, 35.6979439557), (-22.0411360695, 35.4479439557))
            Line((-22.0411360695, 35.4479439557), (-19.1372540375, 35.4479439557))
        make_face()
        with Locations((-28.7911360695, -2.5520560443)):
            Circle(F0_R)
        with Locations((-28.7911360695, -2.5520560443)):
            Circle(F0_R_3, mode=Mode.SUBTRACT)
        with BuildLine():
            Line((-35.2911360695, 23.0894486726), (-35.2911360695, 27.8064392387))
            ThreePointArc((-35.2911360695, 27.8064392387), (-35.5411360695, 25.4479439557), (-35.2911360695, 23.0894486726))
        make_face()
    extrude(amount=-F2_DEPTH)

    # F3
    f3_edges = [f1.edges().sort_by_distance(p)[0] for p in [
        (3.208864, 1.748855, 2),
    ]]
    chamfer(f3_edges, length=F3_SIZE)


solid = f1.part
